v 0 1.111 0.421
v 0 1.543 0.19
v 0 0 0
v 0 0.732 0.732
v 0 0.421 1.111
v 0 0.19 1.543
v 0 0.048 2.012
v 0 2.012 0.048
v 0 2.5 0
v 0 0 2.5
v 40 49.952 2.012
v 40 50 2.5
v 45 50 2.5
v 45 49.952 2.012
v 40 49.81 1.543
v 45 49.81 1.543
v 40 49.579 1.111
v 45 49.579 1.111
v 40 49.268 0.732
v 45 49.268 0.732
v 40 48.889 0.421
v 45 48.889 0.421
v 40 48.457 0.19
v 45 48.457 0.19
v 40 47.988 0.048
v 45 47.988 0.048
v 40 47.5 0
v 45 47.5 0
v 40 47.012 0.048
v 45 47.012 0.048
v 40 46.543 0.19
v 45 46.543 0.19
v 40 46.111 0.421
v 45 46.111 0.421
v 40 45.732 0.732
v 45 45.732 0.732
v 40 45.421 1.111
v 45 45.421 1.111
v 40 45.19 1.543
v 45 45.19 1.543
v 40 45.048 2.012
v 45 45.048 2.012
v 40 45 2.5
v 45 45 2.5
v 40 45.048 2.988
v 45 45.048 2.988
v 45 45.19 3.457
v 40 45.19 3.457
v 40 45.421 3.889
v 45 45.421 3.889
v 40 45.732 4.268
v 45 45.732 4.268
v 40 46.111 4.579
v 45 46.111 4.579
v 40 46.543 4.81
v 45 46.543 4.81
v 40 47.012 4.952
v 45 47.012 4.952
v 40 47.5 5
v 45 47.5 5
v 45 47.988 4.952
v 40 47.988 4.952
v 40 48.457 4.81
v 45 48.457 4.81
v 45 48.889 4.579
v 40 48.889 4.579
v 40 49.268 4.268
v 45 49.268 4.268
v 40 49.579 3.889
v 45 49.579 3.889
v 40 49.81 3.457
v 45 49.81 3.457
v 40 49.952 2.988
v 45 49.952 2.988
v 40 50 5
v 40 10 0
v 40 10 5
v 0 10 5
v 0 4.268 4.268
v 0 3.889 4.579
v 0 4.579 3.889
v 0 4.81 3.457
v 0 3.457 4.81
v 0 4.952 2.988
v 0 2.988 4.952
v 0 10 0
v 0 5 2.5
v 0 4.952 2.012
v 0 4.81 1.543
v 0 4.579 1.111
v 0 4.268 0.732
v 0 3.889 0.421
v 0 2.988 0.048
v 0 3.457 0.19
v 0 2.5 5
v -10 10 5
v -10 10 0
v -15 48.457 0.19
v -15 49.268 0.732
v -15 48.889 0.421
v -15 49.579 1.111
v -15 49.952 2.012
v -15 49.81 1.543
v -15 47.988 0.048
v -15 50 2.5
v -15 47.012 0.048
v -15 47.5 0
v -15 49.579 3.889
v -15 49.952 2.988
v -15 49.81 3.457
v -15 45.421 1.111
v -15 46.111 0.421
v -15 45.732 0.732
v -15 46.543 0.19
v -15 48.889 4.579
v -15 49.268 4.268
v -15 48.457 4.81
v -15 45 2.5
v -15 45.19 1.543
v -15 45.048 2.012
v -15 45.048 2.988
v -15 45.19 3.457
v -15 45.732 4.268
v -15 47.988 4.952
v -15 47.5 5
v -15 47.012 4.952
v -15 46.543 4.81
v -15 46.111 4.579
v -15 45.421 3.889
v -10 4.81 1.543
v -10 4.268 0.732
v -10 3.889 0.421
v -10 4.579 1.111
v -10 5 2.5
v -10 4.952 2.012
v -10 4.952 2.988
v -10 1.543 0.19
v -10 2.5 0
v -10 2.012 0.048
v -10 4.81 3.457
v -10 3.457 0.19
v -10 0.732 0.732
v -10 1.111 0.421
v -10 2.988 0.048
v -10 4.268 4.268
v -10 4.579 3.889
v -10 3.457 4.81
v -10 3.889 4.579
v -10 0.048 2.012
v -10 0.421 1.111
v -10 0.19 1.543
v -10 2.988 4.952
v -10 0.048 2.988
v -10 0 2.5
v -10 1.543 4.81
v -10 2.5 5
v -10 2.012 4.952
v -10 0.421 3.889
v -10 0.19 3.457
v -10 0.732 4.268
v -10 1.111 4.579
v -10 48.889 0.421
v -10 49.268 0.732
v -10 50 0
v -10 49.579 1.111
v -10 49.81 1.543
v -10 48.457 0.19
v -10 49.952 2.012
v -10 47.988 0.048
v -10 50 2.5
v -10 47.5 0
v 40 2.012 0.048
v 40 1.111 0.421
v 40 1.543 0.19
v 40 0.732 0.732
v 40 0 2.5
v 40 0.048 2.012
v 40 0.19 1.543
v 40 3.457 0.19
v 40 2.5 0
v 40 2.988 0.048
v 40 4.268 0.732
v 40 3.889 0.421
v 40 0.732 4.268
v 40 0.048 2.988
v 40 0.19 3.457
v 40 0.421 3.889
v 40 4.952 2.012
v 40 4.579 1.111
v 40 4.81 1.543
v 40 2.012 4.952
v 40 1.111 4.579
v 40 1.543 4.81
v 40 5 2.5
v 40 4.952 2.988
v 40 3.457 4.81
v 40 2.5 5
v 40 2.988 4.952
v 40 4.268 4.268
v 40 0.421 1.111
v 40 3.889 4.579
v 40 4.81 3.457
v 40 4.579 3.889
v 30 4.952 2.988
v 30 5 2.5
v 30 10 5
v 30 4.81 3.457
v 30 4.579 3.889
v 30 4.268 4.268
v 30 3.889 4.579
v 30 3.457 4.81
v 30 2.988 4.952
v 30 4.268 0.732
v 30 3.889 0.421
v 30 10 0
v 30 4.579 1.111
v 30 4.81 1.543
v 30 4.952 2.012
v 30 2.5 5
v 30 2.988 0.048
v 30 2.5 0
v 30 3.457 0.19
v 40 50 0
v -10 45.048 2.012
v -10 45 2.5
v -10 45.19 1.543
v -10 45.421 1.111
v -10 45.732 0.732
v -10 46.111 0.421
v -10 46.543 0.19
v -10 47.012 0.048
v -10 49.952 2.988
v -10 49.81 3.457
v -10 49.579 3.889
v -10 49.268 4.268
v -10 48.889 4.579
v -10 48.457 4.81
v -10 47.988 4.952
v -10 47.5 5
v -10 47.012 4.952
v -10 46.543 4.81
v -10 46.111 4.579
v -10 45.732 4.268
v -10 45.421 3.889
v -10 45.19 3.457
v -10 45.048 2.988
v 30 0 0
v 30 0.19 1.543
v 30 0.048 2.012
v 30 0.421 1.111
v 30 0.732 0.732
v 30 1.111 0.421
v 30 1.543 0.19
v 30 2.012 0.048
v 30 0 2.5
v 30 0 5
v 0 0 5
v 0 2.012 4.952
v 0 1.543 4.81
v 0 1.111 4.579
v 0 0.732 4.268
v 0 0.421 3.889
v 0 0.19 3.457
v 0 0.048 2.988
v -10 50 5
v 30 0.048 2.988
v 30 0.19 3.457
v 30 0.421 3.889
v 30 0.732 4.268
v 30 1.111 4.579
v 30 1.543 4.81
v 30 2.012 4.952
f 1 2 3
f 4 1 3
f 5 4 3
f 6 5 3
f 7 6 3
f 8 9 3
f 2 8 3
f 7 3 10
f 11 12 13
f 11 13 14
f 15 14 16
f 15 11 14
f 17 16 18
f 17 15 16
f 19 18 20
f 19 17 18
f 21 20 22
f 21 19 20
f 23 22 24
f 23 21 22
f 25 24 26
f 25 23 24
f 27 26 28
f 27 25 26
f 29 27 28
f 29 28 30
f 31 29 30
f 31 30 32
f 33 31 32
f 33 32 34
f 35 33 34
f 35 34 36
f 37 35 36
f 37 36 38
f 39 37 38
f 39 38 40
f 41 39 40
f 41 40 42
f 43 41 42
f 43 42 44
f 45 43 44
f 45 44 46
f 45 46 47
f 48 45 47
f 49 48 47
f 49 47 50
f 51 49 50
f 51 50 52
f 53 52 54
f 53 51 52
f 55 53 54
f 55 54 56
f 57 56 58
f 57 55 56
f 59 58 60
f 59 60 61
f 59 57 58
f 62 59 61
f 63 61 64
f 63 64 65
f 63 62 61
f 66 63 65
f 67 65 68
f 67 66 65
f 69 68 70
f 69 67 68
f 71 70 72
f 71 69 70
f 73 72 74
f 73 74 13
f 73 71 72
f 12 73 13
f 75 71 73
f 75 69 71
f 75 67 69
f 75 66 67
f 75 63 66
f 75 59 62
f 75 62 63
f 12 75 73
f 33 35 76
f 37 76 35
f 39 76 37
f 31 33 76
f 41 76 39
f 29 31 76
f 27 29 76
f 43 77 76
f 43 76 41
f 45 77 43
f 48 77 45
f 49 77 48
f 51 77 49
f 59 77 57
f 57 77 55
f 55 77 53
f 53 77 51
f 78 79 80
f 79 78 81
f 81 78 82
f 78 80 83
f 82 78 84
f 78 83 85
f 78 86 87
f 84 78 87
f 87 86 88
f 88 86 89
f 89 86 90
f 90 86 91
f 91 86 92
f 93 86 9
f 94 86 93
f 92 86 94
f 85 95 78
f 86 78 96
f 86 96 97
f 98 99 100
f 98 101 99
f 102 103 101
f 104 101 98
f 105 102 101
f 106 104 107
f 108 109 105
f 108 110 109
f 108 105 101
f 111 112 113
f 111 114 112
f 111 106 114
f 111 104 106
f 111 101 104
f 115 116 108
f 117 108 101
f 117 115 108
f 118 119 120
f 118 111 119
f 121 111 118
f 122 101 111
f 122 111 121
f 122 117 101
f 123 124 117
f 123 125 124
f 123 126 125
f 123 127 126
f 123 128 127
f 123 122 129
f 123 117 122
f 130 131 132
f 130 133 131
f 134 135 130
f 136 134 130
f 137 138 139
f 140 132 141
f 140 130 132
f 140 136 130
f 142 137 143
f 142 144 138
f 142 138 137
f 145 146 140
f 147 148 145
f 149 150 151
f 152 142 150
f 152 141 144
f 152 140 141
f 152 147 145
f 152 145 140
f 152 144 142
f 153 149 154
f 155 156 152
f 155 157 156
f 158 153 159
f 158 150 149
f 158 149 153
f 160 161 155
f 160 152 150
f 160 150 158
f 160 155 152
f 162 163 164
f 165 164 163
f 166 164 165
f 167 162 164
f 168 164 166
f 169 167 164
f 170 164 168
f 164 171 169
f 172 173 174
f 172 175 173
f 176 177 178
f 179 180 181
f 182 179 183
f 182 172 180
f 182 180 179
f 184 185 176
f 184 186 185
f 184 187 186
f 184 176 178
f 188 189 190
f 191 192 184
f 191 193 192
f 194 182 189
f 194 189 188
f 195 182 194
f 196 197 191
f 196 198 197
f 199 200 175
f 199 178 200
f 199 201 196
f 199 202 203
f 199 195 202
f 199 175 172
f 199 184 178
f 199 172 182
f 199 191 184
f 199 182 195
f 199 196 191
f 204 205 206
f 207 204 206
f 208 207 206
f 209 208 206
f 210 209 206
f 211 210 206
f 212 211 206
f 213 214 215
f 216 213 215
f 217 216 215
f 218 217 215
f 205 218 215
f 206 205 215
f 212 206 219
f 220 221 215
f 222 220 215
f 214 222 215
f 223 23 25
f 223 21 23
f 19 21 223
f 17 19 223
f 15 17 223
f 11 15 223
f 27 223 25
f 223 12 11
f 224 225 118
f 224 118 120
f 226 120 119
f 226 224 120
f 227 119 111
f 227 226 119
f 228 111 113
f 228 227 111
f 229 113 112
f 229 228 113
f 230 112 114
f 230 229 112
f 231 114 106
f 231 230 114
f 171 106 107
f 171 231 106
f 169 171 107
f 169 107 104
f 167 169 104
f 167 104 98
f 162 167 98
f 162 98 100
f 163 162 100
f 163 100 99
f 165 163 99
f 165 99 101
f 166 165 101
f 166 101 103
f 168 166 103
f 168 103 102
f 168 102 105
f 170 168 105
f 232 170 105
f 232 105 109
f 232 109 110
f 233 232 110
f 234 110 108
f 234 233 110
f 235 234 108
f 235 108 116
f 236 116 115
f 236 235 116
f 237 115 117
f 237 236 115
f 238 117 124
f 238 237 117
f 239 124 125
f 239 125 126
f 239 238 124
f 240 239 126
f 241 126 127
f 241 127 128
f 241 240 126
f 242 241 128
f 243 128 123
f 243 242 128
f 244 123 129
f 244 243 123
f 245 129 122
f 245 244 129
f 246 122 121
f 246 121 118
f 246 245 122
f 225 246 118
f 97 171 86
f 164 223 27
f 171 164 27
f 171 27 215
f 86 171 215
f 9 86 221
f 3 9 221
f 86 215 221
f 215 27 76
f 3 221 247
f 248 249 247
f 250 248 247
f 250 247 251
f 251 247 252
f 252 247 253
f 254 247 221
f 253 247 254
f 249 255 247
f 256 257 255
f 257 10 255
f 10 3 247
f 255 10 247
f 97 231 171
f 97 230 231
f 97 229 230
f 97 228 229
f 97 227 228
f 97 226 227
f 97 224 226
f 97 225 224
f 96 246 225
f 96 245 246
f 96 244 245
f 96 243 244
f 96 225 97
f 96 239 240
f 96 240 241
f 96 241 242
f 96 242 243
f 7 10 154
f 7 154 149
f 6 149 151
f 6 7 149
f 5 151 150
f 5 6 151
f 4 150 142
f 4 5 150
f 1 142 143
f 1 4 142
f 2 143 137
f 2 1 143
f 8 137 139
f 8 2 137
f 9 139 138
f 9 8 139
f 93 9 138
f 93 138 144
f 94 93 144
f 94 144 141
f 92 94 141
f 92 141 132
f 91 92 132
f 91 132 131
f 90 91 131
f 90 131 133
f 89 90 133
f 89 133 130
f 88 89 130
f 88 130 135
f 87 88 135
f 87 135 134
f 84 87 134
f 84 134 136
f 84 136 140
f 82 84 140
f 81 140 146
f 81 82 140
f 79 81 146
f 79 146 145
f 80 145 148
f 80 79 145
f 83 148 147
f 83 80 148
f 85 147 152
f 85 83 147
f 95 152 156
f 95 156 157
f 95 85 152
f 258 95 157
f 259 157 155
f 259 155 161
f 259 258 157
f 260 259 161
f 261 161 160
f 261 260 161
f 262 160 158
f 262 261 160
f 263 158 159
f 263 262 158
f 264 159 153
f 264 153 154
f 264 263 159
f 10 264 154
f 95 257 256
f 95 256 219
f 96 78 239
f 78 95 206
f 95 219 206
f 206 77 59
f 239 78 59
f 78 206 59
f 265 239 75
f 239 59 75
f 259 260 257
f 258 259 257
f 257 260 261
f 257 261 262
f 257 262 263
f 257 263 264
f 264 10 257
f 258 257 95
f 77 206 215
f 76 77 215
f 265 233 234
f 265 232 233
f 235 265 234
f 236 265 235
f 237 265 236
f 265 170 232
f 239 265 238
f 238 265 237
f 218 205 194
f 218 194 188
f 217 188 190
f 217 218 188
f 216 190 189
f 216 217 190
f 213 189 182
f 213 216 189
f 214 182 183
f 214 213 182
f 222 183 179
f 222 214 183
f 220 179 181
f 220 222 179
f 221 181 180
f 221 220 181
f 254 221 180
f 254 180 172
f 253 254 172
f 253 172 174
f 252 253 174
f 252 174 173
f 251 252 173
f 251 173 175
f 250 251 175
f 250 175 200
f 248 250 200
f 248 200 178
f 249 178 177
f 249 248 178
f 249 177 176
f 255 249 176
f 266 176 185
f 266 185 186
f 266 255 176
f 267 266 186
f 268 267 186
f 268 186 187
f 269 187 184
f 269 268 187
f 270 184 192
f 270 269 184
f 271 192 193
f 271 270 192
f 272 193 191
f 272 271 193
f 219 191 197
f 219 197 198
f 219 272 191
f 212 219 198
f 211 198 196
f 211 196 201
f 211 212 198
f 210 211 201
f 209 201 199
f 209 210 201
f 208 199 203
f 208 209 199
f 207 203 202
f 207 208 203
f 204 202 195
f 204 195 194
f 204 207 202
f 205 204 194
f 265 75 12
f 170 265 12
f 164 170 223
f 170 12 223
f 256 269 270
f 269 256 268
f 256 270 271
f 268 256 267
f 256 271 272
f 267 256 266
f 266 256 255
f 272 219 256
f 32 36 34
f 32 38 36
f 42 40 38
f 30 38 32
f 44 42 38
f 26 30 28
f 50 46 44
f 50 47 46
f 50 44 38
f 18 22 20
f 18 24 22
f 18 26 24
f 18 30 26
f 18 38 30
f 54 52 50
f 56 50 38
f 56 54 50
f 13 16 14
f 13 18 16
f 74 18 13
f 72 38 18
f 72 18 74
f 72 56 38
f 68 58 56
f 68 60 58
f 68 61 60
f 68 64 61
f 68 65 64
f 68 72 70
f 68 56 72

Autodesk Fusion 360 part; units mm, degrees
sketch "Sketch1" plane through (0, 0, 0) normal (0, 0, 1) x (1, 0, 0)
  line L0 (0, 0) -> (30, 0)
  line L1 (30, 0) -> (30, 50)
  line L2 (30, 50) -> (0, 50)
  line L3 (0, 50) -> (0, 0)
  dimension "d1" = 30
  dimension "d2" = 50
extrude "Extrude1" add sketch "Sketch1" along normal blind 5
sketch "Sketch3" plane through (30, 0, 0) normal (1, 0, 0) x (0, 1, 0)
  line L0 (0, 0) -> (50, 0)
  line L1 (50, 0) -> (50, 5)
  line L2 (50, 5) -> (0, 5)
  line L3 (0, 5) -> (0, 0)
  line L4 (50, 5) -> (10, 5)
  line L5 (10, 5) -> (10, 0)
  line L6 (10, 0) -> (50, 0)
  line L7 (50, 0) -> (50, 5)
  dimension "d9" = 40
  dimension "d10" = 5
extrude "Extrude3" add sketch "Sketch3" along normal blind 10 contours L0 L1 L2 L4 L5 L6 L7
sketch "Sketch4" plane through (0, 0, 0) normal (-1, 0, 0) x (0, -1, 0)
  line L0 (-50, 0) -> (0, 0)
  line L1 (0, 0) -> (0, 5)
  line L2 (0, 5) -> (-50, 5)
  line L3 (-50, 5) -> (-50, 0)
  line L4 (-50, 5) -> (-10, 5)
  line L5 (-10, 5) -> (-10, 0)
  line L6 (-10, 0) -> (-50, 0)
  line L7 (-50, 0) -> (-50, 5)
  dimension "d13" = 40
  dimension "d14" = 5
extrude "Extrude4" add sketch "Sketch4" along normal blind 10 contours L0 L2 L3 L4 L5 L6 L7
sketch "Sketch5" plane through (0, 0, 0) normal (-1, 0, 0) x (0, -1, 0)
  line L0 (-10, 5) -> (-10, 0)
  line L1 (-10, 0) -> (0, 0)
  line L2 (0, 0) -> (0, 5)
  line L3 (0, 5) -> (-10, 5)
  circle A0 centre (-2.5, 2.5) radius 2.5
  dimension "d17" = 5
extrude "Extrude5" add sketch "Sketch5" along normal blind 10 contours A0
sketch "Sketch6" plane through (30, 0, 0) normal (1, 0, 0) x (0, 1, 0)
  line L0 (10, 0) -> (10, 5)
  line L1 (10, 5) -> (0, 5)
  line L2 (0, 5) -> (0, 0)
  line L3 (0, 0) -> (10, 0)
  circle A0 centre (2.5, 2.5) radius 2.5
  dimension "d20" = 5
extrude "Extrude6" add sketch "Sketch6" along normal blind 10 contours A0
sketch "Sketch7" plane through (40, 0, 0) normal (1, 0, 0) x (0, 1, 0)
  line L0 (50, 0) -> (50, 5)
  line L1 (50, 5) -> (10, 5)
  line L2 (10, 5) -> (10, 0)
  line L3 (10, 0) -> (50, 0)
  circle A0 centre (47.5, 2.5) radius 2.5
  dimension "d23" = 5
extrude "Extrude7" add sketch "Sketch7" along normal blind 5 contours A0
sketch "Sketch8" plane through (-10, 0, 0) normal (-1, 0, 0) x (0, -1, 0)
  line L0 (-50, 0) -> (-10, 0)
  line L1 (-10, 0) -> (-10, 5)
  line L2 (-10, 5) -> (-50, 5)
  line L3 (-50, 5) -> (-50, 0)
  circle A0 centre (-47.5, 2.5) radius 2.5
  dimension "d26" = 5
extrude "Extrude8" add sketch "Sketch8" along normal blind 5 contours A0
